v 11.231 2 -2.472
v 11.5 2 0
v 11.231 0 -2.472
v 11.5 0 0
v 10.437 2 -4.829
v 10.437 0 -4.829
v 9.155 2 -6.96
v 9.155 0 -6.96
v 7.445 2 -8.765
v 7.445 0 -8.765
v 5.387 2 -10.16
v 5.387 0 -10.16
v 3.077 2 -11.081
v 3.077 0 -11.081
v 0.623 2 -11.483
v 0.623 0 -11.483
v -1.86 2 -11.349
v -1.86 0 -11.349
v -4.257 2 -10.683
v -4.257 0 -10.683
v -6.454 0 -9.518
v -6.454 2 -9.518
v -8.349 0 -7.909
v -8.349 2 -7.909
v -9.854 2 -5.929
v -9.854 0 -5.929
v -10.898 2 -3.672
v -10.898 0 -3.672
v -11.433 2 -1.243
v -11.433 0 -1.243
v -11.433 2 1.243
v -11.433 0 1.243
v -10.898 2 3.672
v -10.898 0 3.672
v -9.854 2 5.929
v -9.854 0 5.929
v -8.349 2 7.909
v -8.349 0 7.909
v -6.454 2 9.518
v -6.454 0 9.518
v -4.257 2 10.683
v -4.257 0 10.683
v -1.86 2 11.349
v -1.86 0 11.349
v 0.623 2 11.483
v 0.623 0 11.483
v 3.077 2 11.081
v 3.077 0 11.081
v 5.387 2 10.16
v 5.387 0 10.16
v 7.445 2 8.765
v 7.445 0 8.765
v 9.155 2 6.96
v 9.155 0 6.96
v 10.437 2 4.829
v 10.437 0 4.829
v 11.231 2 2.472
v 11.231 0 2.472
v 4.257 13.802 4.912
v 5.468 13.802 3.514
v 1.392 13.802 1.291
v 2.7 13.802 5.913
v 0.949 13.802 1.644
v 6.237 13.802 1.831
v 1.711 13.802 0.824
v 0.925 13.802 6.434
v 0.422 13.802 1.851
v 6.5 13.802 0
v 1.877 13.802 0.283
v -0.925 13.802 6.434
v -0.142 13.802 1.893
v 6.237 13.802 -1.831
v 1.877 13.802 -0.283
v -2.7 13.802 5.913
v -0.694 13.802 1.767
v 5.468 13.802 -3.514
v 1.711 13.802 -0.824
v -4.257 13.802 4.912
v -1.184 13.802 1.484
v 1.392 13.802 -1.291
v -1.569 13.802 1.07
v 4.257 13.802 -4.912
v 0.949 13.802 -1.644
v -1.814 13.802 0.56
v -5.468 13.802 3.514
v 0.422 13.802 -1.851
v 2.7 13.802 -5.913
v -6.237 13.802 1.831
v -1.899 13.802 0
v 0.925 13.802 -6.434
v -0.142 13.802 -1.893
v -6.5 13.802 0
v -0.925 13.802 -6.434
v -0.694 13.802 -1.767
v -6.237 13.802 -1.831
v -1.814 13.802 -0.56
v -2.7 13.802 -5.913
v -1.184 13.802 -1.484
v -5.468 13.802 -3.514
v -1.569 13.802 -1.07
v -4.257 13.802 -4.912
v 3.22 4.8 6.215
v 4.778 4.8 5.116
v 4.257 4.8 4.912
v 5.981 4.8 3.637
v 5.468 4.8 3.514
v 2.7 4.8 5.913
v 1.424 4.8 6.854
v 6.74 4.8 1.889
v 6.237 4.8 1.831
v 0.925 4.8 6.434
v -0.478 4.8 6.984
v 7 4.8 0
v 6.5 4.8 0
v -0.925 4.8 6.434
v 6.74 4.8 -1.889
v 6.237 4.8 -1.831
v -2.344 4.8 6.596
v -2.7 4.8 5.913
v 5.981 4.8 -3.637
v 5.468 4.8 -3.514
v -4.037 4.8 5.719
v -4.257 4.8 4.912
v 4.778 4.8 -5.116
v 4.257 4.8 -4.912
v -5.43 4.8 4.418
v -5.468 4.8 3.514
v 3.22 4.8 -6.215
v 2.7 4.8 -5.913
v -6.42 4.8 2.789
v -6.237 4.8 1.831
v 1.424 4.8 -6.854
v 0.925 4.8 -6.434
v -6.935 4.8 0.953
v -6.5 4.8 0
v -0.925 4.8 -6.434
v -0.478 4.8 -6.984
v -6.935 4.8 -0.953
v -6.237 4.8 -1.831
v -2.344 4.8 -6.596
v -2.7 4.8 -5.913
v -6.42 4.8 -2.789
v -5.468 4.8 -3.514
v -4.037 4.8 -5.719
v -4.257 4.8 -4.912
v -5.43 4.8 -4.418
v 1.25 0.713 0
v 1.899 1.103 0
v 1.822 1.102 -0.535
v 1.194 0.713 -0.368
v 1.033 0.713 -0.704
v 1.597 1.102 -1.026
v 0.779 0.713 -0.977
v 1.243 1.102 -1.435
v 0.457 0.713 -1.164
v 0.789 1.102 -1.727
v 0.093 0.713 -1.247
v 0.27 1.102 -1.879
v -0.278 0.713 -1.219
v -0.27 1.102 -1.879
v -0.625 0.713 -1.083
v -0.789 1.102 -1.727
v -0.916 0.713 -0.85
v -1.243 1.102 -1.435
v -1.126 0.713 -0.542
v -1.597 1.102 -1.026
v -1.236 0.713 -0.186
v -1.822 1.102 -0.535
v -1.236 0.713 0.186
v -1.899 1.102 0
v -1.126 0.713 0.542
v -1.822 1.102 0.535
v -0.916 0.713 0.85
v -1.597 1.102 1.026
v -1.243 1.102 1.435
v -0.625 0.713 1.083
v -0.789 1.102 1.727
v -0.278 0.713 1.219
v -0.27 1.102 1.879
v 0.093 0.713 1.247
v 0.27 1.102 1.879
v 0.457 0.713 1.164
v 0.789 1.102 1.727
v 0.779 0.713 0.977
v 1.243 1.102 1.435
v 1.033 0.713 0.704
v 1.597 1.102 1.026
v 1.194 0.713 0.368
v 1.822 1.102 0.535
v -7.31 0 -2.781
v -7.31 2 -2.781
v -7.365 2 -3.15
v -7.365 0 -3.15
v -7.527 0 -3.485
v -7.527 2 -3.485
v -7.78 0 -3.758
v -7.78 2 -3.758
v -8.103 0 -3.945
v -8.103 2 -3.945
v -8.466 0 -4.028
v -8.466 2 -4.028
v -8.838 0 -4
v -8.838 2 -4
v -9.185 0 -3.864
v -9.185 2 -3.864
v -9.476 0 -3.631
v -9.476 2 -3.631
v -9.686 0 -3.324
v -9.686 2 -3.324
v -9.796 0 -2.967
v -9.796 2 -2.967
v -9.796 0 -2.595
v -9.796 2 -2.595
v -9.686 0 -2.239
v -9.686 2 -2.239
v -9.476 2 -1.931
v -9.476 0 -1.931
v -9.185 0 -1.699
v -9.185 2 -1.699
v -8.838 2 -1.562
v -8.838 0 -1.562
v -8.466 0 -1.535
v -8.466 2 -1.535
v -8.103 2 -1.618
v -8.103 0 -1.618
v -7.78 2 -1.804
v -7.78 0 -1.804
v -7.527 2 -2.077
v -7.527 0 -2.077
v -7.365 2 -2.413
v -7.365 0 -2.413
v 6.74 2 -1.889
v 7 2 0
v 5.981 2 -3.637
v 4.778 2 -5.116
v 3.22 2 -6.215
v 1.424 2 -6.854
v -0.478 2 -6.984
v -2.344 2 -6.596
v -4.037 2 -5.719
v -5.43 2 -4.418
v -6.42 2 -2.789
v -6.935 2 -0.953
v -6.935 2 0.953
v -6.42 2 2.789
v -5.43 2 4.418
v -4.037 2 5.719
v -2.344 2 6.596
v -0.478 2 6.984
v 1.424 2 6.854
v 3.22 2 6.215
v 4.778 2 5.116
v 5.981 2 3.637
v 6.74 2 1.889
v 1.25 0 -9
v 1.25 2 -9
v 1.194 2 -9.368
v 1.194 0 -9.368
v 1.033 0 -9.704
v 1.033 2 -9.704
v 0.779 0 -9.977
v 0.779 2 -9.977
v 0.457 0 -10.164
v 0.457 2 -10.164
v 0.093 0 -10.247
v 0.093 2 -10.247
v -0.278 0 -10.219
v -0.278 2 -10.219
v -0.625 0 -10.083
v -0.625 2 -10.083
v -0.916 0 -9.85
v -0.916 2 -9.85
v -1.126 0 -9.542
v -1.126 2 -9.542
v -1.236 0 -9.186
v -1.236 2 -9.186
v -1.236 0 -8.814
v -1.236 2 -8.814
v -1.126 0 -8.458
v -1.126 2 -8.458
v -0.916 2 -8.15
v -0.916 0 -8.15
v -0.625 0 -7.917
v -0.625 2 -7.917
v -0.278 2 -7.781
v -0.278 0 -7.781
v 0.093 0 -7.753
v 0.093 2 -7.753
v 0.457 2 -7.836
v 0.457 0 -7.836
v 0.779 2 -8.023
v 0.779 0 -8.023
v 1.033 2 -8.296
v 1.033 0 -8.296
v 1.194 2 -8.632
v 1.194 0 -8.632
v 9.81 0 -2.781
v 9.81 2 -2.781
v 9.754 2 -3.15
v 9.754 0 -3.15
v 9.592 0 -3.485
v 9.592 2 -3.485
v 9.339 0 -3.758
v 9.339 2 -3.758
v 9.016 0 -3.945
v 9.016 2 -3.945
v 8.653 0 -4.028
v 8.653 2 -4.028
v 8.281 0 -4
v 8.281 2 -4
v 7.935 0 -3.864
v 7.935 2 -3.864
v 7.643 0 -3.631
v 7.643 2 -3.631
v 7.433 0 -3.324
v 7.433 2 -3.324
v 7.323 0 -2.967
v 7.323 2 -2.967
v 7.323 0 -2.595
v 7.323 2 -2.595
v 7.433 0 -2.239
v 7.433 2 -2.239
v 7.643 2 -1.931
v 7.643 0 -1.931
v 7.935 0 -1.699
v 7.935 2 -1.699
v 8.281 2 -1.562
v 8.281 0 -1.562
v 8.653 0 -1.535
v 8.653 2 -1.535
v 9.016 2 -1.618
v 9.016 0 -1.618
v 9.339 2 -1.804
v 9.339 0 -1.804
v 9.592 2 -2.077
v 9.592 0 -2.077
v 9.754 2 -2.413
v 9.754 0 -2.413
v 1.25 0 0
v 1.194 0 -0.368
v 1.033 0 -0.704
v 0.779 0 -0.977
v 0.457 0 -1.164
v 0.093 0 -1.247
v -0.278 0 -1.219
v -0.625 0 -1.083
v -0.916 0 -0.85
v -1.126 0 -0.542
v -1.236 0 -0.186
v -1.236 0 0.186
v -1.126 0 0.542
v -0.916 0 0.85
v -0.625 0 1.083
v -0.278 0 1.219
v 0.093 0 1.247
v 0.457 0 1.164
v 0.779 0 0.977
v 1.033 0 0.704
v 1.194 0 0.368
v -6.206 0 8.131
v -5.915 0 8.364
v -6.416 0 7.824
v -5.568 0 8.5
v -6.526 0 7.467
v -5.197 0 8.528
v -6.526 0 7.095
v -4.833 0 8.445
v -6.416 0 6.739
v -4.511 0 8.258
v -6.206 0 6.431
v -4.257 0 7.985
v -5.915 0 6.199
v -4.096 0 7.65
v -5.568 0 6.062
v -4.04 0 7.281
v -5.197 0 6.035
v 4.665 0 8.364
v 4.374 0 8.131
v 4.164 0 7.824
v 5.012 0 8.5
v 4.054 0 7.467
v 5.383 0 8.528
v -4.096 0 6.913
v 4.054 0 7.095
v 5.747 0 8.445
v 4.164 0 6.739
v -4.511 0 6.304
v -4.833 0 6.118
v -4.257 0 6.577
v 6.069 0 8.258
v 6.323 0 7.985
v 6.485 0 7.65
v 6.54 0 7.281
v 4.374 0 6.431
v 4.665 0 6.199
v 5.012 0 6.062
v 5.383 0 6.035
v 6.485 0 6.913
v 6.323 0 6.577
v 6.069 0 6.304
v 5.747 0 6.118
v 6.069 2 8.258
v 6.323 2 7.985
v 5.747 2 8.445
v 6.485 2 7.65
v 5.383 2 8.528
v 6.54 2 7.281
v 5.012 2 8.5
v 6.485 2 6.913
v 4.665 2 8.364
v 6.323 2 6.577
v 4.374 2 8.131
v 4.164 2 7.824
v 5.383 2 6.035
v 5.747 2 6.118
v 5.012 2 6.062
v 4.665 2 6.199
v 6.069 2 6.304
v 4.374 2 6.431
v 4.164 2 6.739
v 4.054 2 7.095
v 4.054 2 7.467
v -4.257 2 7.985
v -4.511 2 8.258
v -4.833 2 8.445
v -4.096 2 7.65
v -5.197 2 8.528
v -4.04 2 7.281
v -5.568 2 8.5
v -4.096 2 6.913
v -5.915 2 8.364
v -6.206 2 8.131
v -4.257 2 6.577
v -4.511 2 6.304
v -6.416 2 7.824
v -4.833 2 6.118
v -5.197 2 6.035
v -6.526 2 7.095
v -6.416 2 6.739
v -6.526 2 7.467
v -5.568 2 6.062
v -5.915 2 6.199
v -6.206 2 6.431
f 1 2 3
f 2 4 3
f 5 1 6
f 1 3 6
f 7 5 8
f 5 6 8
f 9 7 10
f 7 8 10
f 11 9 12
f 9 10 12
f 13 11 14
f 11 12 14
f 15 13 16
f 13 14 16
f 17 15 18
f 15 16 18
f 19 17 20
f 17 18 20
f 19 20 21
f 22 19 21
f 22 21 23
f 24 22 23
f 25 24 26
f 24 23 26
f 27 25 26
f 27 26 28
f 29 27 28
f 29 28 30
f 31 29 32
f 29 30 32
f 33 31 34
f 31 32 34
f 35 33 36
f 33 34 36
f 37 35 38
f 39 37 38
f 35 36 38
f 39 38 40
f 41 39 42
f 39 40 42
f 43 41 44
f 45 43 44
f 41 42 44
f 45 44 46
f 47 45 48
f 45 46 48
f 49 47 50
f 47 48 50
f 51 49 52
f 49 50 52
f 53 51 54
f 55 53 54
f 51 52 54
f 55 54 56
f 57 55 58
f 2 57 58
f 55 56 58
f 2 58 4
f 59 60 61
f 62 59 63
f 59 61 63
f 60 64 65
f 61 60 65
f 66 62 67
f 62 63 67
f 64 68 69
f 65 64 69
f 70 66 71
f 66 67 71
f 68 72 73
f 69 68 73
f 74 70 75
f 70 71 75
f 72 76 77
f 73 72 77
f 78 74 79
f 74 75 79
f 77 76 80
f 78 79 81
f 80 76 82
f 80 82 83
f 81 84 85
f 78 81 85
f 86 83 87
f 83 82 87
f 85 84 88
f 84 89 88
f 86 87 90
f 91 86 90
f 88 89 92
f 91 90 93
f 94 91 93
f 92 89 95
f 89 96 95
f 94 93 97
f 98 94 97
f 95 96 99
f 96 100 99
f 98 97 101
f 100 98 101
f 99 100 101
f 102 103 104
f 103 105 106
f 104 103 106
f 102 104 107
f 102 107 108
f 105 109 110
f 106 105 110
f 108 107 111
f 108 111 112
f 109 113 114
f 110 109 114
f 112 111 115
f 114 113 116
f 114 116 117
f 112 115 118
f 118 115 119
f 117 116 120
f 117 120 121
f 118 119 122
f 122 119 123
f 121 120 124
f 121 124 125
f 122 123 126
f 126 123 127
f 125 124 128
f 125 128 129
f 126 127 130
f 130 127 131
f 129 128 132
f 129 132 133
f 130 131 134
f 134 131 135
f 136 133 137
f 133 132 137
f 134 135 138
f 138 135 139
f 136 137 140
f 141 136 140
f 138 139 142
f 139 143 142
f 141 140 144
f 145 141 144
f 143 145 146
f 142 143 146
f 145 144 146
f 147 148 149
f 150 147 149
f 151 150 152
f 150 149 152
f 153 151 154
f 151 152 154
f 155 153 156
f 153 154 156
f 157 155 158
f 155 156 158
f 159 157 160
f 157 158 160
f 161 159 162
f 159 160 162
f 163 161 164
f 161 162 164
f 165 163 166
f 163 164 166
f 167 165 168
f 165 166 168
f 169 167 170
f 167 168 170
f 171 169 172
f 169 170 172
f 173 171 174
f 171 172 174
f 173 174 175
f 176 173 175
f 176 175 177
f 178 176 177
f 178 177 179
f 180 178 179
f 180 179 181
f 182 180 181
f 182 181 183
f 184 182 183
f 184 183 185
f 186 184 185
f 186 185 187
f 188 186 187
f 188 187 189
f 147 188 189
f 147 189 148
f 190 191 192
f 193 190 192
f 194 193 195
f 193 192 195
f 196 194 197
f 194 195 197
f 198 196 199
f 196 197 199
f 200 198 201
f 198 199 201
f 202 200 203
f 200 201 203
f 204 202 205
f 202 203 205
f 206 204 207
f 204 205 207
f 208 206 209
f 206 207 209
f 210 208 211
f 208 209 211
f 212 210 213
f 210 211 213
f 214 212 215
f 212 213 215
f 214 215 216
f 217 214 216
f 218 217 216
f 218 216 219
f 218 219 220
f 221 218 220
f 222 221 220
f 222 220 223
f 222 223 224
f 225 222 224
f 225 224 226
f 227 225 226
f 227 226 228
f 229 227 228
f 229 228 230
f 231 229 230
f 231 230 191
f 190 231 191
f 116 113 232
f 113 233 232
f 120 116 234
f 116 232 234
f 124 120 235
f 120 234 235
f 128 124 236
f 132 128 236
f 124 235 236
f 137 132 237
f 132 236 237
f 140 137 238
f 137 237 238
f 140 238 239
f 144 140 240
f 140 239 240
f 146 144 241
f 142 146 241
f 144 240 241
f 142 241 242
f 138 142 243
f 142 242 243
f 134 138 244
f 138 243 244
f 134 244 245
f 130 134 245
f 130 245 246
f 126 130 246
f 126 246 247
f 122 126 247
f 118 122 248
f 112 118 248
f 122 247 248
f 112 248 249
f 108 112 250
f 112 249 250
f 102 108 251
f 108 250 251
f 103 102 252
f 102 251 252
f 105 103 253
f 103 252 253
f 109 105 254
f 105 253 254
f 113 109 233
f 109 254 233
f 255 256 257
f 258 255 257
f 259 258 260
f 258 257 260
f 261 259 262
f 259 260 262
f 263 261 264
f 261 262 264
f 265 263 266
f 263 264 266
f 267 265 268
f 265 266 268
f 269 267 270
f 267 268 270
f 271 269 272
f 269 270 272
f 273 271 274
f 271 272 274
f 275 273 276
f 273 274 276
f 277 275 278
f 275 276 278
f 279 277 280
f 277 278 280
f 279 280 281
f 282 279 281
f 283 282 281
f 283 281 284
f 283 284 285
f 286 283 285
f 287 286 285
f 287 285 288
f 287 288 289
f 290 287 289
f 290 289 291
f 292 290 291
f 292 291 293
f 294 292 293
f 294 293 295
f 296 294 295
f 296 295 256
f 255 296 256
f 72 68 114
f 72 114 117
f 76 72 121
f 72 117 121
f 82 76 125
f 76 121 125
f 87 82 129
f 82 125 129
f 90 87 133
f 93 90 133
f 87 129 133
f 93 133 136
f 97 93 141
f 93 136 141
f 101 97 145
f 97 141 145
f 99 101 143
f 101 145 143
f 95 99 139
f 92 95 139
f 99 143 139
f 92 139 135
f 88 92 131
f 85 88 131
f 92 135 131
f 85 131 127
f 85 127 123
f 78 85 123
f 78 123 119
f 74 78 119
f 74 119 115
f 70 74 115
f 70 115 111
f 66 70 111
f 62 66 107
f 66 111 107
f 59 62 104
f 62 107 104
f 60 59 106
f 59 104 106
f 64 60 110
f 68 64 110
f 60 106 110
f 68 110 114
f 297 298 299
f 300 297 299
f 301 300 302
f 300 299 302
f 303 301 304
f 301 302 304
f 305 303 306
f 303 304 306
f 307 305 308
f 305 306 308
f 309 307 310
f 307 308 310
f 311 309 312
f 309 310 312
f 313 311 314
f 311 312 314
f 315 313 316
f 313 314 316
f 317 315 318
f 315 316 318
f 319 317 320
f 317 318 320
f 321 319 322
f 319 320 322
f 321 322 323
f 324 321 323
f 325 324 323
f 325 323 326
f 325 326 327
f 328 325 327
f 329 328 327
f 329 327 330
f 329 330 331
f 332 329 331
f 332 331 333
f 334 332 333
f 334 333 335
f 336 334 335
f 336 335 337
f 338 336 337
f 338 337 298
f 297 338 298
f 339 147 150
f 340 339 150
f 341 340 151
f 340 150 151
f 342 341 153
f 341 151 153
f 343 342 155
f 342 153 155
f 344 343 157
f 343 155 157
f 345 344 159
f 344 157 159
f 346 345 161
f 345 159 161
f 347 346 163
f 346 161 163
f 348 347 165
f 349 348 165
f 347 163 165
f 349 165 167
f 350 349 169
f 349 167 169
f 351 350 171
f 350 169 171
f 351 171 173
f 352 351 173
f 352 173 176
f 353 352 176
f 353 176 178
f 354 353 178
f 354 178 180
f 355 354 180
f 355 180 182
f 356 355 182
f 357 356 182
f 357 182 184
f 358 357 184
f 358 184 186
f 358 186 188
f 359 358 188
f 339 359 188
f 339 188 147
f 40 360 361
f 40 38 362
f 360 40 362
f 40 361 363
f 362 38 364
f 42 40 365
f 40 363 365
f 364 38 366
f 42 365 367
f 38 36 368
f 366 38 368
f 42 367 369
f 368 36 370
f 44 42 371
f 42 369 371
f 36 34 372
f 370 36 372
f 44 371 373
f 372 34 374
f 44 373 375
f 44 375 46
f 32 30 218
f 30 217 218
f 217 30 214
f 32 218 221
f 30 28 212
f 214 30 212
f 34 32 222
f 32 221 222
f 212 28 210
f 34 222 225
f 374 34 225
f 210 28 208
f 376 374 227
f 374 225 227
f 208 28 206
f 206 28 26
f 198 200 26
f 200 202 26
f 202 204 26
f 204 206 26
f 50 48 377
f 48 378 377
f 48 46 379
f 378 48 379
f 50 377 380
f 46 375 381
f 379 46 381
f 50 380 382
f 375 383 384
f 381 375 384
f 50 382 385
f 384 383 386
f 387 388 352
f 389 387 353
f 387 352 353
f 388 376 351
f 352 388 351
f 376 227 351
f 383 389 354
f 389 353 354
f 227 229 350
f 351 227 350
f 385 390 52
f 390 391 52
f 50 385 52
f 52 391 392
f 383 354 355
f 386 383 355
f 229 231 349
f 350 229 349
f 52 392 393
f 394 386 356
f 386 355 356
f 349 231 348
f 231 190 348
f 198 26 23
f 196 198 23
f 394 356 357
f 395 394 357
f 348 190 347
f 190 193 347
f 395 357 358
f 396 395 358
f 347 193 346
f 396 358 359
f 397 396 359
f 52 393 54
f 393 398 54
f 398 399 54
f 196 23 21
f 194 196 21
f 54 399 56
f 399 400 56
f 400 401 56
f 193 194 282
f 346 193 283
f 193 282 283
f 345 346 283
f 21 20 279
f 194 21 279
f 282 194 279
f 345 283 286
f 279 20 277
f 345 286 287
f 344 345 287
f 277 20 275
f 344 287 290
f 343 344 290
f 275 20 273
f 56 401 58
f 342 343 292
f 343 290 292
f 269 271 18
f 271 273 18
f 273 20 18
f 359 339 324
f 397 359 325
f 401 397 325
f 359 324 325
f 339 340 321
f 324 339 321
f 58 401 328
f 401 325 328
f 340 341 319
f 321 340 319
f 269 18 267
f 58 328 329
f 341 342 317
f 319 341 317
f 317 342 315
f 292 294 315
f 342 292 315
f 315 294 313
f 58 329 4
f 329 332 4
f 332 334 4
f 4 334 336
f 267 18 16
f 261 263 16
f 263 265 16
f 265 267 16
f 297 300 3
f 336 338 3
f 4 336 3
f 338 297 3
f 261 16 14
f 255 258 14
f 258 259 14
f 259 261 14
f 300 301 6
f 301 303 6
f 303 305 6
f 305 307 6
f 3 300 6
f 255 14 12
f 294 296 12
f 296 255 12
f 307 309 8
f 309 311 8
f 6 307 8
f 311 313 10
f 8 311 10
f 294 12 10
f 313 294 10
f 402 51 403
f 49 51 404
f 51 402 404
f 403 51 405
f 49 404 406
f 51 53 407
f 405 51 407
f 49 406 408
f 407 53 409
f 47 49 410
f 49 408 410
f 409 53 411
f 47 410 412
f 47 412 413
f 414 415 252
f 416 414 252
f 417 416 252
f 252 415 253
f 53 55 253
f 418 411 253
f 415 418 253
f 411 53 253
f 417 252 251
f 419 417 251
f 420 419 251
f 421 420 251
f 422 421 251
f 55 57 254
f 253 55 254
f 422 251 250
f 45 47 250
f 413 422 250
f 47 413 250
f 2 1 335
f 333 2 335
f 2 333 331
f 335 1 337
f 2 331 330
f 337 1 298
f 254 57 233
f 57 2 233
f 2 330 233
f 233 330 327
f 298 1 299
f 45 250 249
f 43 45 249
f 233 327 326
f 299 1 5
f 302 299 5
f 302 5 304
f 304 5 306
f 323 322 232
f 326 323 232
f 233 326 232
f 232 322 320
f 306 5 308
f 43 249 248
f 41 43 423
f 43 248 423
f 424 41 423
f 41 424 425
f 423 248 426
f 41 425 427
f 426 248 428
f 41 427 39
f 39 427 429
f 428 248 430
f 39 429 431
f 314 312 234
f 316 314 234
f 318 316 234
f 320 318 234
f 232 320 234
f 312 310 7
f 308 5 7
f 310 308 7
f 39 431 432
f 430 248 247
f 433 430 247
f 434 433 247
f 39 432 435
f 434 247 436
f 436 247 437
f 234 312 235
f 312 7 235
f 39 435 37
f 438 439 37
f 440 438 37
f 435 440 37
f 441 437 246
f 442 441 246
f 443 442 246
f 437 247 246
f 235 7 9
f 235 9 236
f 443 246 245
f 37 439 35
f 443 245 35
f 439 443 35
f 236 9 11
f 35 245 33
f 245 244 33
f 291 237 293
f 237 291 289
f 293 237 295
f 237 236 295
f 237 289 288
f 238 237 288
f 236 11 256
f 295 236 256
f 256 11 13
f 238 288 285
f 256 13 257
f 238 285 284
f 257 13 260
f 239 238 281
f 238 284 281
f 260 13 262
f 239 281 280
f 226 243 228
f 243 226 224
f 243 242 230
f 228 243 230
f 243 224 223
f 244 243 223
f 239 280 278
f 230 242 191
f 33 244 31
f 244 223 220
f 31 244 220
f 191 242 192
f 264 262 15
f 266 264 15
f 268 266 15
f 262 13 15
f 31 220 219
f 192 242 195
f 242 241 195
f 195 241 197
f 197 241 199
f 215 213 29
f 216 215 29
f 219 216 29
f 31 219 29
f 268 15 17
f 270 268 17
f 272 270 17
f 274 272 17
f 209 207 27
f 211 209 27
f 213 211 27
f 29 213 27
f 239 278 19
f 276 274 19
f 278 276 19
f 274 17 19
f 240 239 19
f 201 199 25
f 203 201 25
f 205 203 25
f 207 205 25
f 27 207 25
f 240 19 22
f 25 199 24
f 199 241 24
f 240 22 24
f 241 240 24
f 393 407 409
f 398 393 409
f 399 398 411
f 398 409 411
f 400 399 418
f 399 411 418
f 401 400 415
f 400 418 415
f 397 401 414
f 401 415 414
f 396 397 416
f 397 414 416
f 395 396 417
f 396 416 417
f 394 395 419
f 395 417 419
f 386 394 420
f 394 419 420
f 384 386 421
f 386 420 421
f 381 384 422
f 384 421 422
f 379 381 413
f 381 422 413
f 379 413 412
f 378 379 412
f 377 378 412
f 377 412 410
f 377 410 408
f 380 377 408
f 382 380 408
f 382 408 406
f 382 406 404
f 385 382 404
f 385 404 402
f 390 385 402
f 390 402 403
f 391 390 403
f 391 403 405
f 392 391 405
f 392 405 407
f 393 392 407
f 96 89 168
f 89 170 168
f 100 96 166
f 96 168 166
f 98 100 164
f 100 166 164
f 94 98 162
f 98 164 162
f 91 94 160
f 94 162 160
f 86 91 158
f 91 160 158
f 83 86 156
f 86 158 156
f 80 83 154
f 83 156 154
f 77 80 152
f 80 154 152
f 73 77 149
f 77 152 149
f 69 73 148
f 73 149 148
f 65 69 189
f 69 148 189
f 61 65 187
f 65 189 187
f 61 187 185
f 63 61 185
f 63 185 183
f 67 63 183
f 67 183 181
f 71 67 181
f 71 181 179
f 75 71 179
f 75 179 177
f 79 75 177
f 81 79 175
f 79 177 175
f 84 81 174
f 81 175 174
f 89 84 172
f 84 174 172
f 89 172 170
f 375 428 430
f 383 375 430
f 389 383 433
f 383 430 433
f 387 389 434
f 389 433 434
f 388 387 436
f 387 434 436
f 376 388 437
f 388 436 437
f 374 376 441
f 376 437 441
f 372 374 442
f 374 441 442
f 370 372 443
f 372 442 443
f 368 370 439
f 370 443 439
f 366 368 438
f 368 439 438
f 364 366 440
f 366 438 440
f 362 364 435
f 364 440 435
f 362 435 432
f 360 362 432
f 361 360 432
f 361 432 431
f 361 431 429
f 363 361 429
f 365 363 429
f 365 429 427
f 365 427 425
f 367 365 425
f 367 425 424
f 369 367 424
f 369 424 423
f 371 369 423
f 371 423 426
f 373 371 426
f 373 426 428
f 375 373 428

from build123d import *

# Parameters (mm, degrees)
M3X0_5_TAPPED_HOLE1_D      = 2.5
F_10_24_TAPPED_HOLE1_D     = 3.7973
F_10_24_TAPPED_HOLE1_DEPTH = 12.7
F_10_24_TAPPED_HOLE1_TIP   = 1.140824014


with BuildPart() as part:
    # Sketch1 → Revolve1 (revolve)
    with BuildSketch(Plane.XY):
        Polygon((0, 13.8025), (6.5, 13.8025), (6.5, 4.8), (7, 4.8), (7, 2), (11.5, 2), (11.5, 0), (0, 0), align=None)
    revolve(axis=Axis((0, 0, 0), (0, 1, 0)))

    # M3x0.5 Tapped Hole1 (through all)
    with Locations(Plane(origin=(0, 0, 0), x_dir=(-1, 0, 0), z_dir=(0, -1, 0))):
        with Locations((0, 9), (8.559508647, 2.781152949), (5.290067271, -7.281152949), (-5.290067271, -7.281152949), (-8.559508647, 2.781152949), (0, 0)):
            Hole(M3X0_5_TAPPED_HOLE1_D / 2)

    # #10-24 Tapped Hole1
    with Locations(Plane(origin=(0, 13.8025, 0), x_dir=(1, 0, 0), z_dir=(0, 1, 0))):
        with Locations((0, 0)):
            Hole(F_10_24_TAPPED_HOLE1_D / 2, depth=F_10_24_TAPPED_HOLE1_DEPTH)
            with Locations((0, 0, -(F_10_24_TAPPED_HOLE1_DEPTH + F_10_24_TAPPED_HOLE1_TIP / 2))):  # 118° drill point
                Cone(0, F_10_24_TAPPED_HOLE1_D / 2, F_10_24_TAPPED_HOLE1_TIP, mode=Mode.SUBTRACT)


solid = part.part
